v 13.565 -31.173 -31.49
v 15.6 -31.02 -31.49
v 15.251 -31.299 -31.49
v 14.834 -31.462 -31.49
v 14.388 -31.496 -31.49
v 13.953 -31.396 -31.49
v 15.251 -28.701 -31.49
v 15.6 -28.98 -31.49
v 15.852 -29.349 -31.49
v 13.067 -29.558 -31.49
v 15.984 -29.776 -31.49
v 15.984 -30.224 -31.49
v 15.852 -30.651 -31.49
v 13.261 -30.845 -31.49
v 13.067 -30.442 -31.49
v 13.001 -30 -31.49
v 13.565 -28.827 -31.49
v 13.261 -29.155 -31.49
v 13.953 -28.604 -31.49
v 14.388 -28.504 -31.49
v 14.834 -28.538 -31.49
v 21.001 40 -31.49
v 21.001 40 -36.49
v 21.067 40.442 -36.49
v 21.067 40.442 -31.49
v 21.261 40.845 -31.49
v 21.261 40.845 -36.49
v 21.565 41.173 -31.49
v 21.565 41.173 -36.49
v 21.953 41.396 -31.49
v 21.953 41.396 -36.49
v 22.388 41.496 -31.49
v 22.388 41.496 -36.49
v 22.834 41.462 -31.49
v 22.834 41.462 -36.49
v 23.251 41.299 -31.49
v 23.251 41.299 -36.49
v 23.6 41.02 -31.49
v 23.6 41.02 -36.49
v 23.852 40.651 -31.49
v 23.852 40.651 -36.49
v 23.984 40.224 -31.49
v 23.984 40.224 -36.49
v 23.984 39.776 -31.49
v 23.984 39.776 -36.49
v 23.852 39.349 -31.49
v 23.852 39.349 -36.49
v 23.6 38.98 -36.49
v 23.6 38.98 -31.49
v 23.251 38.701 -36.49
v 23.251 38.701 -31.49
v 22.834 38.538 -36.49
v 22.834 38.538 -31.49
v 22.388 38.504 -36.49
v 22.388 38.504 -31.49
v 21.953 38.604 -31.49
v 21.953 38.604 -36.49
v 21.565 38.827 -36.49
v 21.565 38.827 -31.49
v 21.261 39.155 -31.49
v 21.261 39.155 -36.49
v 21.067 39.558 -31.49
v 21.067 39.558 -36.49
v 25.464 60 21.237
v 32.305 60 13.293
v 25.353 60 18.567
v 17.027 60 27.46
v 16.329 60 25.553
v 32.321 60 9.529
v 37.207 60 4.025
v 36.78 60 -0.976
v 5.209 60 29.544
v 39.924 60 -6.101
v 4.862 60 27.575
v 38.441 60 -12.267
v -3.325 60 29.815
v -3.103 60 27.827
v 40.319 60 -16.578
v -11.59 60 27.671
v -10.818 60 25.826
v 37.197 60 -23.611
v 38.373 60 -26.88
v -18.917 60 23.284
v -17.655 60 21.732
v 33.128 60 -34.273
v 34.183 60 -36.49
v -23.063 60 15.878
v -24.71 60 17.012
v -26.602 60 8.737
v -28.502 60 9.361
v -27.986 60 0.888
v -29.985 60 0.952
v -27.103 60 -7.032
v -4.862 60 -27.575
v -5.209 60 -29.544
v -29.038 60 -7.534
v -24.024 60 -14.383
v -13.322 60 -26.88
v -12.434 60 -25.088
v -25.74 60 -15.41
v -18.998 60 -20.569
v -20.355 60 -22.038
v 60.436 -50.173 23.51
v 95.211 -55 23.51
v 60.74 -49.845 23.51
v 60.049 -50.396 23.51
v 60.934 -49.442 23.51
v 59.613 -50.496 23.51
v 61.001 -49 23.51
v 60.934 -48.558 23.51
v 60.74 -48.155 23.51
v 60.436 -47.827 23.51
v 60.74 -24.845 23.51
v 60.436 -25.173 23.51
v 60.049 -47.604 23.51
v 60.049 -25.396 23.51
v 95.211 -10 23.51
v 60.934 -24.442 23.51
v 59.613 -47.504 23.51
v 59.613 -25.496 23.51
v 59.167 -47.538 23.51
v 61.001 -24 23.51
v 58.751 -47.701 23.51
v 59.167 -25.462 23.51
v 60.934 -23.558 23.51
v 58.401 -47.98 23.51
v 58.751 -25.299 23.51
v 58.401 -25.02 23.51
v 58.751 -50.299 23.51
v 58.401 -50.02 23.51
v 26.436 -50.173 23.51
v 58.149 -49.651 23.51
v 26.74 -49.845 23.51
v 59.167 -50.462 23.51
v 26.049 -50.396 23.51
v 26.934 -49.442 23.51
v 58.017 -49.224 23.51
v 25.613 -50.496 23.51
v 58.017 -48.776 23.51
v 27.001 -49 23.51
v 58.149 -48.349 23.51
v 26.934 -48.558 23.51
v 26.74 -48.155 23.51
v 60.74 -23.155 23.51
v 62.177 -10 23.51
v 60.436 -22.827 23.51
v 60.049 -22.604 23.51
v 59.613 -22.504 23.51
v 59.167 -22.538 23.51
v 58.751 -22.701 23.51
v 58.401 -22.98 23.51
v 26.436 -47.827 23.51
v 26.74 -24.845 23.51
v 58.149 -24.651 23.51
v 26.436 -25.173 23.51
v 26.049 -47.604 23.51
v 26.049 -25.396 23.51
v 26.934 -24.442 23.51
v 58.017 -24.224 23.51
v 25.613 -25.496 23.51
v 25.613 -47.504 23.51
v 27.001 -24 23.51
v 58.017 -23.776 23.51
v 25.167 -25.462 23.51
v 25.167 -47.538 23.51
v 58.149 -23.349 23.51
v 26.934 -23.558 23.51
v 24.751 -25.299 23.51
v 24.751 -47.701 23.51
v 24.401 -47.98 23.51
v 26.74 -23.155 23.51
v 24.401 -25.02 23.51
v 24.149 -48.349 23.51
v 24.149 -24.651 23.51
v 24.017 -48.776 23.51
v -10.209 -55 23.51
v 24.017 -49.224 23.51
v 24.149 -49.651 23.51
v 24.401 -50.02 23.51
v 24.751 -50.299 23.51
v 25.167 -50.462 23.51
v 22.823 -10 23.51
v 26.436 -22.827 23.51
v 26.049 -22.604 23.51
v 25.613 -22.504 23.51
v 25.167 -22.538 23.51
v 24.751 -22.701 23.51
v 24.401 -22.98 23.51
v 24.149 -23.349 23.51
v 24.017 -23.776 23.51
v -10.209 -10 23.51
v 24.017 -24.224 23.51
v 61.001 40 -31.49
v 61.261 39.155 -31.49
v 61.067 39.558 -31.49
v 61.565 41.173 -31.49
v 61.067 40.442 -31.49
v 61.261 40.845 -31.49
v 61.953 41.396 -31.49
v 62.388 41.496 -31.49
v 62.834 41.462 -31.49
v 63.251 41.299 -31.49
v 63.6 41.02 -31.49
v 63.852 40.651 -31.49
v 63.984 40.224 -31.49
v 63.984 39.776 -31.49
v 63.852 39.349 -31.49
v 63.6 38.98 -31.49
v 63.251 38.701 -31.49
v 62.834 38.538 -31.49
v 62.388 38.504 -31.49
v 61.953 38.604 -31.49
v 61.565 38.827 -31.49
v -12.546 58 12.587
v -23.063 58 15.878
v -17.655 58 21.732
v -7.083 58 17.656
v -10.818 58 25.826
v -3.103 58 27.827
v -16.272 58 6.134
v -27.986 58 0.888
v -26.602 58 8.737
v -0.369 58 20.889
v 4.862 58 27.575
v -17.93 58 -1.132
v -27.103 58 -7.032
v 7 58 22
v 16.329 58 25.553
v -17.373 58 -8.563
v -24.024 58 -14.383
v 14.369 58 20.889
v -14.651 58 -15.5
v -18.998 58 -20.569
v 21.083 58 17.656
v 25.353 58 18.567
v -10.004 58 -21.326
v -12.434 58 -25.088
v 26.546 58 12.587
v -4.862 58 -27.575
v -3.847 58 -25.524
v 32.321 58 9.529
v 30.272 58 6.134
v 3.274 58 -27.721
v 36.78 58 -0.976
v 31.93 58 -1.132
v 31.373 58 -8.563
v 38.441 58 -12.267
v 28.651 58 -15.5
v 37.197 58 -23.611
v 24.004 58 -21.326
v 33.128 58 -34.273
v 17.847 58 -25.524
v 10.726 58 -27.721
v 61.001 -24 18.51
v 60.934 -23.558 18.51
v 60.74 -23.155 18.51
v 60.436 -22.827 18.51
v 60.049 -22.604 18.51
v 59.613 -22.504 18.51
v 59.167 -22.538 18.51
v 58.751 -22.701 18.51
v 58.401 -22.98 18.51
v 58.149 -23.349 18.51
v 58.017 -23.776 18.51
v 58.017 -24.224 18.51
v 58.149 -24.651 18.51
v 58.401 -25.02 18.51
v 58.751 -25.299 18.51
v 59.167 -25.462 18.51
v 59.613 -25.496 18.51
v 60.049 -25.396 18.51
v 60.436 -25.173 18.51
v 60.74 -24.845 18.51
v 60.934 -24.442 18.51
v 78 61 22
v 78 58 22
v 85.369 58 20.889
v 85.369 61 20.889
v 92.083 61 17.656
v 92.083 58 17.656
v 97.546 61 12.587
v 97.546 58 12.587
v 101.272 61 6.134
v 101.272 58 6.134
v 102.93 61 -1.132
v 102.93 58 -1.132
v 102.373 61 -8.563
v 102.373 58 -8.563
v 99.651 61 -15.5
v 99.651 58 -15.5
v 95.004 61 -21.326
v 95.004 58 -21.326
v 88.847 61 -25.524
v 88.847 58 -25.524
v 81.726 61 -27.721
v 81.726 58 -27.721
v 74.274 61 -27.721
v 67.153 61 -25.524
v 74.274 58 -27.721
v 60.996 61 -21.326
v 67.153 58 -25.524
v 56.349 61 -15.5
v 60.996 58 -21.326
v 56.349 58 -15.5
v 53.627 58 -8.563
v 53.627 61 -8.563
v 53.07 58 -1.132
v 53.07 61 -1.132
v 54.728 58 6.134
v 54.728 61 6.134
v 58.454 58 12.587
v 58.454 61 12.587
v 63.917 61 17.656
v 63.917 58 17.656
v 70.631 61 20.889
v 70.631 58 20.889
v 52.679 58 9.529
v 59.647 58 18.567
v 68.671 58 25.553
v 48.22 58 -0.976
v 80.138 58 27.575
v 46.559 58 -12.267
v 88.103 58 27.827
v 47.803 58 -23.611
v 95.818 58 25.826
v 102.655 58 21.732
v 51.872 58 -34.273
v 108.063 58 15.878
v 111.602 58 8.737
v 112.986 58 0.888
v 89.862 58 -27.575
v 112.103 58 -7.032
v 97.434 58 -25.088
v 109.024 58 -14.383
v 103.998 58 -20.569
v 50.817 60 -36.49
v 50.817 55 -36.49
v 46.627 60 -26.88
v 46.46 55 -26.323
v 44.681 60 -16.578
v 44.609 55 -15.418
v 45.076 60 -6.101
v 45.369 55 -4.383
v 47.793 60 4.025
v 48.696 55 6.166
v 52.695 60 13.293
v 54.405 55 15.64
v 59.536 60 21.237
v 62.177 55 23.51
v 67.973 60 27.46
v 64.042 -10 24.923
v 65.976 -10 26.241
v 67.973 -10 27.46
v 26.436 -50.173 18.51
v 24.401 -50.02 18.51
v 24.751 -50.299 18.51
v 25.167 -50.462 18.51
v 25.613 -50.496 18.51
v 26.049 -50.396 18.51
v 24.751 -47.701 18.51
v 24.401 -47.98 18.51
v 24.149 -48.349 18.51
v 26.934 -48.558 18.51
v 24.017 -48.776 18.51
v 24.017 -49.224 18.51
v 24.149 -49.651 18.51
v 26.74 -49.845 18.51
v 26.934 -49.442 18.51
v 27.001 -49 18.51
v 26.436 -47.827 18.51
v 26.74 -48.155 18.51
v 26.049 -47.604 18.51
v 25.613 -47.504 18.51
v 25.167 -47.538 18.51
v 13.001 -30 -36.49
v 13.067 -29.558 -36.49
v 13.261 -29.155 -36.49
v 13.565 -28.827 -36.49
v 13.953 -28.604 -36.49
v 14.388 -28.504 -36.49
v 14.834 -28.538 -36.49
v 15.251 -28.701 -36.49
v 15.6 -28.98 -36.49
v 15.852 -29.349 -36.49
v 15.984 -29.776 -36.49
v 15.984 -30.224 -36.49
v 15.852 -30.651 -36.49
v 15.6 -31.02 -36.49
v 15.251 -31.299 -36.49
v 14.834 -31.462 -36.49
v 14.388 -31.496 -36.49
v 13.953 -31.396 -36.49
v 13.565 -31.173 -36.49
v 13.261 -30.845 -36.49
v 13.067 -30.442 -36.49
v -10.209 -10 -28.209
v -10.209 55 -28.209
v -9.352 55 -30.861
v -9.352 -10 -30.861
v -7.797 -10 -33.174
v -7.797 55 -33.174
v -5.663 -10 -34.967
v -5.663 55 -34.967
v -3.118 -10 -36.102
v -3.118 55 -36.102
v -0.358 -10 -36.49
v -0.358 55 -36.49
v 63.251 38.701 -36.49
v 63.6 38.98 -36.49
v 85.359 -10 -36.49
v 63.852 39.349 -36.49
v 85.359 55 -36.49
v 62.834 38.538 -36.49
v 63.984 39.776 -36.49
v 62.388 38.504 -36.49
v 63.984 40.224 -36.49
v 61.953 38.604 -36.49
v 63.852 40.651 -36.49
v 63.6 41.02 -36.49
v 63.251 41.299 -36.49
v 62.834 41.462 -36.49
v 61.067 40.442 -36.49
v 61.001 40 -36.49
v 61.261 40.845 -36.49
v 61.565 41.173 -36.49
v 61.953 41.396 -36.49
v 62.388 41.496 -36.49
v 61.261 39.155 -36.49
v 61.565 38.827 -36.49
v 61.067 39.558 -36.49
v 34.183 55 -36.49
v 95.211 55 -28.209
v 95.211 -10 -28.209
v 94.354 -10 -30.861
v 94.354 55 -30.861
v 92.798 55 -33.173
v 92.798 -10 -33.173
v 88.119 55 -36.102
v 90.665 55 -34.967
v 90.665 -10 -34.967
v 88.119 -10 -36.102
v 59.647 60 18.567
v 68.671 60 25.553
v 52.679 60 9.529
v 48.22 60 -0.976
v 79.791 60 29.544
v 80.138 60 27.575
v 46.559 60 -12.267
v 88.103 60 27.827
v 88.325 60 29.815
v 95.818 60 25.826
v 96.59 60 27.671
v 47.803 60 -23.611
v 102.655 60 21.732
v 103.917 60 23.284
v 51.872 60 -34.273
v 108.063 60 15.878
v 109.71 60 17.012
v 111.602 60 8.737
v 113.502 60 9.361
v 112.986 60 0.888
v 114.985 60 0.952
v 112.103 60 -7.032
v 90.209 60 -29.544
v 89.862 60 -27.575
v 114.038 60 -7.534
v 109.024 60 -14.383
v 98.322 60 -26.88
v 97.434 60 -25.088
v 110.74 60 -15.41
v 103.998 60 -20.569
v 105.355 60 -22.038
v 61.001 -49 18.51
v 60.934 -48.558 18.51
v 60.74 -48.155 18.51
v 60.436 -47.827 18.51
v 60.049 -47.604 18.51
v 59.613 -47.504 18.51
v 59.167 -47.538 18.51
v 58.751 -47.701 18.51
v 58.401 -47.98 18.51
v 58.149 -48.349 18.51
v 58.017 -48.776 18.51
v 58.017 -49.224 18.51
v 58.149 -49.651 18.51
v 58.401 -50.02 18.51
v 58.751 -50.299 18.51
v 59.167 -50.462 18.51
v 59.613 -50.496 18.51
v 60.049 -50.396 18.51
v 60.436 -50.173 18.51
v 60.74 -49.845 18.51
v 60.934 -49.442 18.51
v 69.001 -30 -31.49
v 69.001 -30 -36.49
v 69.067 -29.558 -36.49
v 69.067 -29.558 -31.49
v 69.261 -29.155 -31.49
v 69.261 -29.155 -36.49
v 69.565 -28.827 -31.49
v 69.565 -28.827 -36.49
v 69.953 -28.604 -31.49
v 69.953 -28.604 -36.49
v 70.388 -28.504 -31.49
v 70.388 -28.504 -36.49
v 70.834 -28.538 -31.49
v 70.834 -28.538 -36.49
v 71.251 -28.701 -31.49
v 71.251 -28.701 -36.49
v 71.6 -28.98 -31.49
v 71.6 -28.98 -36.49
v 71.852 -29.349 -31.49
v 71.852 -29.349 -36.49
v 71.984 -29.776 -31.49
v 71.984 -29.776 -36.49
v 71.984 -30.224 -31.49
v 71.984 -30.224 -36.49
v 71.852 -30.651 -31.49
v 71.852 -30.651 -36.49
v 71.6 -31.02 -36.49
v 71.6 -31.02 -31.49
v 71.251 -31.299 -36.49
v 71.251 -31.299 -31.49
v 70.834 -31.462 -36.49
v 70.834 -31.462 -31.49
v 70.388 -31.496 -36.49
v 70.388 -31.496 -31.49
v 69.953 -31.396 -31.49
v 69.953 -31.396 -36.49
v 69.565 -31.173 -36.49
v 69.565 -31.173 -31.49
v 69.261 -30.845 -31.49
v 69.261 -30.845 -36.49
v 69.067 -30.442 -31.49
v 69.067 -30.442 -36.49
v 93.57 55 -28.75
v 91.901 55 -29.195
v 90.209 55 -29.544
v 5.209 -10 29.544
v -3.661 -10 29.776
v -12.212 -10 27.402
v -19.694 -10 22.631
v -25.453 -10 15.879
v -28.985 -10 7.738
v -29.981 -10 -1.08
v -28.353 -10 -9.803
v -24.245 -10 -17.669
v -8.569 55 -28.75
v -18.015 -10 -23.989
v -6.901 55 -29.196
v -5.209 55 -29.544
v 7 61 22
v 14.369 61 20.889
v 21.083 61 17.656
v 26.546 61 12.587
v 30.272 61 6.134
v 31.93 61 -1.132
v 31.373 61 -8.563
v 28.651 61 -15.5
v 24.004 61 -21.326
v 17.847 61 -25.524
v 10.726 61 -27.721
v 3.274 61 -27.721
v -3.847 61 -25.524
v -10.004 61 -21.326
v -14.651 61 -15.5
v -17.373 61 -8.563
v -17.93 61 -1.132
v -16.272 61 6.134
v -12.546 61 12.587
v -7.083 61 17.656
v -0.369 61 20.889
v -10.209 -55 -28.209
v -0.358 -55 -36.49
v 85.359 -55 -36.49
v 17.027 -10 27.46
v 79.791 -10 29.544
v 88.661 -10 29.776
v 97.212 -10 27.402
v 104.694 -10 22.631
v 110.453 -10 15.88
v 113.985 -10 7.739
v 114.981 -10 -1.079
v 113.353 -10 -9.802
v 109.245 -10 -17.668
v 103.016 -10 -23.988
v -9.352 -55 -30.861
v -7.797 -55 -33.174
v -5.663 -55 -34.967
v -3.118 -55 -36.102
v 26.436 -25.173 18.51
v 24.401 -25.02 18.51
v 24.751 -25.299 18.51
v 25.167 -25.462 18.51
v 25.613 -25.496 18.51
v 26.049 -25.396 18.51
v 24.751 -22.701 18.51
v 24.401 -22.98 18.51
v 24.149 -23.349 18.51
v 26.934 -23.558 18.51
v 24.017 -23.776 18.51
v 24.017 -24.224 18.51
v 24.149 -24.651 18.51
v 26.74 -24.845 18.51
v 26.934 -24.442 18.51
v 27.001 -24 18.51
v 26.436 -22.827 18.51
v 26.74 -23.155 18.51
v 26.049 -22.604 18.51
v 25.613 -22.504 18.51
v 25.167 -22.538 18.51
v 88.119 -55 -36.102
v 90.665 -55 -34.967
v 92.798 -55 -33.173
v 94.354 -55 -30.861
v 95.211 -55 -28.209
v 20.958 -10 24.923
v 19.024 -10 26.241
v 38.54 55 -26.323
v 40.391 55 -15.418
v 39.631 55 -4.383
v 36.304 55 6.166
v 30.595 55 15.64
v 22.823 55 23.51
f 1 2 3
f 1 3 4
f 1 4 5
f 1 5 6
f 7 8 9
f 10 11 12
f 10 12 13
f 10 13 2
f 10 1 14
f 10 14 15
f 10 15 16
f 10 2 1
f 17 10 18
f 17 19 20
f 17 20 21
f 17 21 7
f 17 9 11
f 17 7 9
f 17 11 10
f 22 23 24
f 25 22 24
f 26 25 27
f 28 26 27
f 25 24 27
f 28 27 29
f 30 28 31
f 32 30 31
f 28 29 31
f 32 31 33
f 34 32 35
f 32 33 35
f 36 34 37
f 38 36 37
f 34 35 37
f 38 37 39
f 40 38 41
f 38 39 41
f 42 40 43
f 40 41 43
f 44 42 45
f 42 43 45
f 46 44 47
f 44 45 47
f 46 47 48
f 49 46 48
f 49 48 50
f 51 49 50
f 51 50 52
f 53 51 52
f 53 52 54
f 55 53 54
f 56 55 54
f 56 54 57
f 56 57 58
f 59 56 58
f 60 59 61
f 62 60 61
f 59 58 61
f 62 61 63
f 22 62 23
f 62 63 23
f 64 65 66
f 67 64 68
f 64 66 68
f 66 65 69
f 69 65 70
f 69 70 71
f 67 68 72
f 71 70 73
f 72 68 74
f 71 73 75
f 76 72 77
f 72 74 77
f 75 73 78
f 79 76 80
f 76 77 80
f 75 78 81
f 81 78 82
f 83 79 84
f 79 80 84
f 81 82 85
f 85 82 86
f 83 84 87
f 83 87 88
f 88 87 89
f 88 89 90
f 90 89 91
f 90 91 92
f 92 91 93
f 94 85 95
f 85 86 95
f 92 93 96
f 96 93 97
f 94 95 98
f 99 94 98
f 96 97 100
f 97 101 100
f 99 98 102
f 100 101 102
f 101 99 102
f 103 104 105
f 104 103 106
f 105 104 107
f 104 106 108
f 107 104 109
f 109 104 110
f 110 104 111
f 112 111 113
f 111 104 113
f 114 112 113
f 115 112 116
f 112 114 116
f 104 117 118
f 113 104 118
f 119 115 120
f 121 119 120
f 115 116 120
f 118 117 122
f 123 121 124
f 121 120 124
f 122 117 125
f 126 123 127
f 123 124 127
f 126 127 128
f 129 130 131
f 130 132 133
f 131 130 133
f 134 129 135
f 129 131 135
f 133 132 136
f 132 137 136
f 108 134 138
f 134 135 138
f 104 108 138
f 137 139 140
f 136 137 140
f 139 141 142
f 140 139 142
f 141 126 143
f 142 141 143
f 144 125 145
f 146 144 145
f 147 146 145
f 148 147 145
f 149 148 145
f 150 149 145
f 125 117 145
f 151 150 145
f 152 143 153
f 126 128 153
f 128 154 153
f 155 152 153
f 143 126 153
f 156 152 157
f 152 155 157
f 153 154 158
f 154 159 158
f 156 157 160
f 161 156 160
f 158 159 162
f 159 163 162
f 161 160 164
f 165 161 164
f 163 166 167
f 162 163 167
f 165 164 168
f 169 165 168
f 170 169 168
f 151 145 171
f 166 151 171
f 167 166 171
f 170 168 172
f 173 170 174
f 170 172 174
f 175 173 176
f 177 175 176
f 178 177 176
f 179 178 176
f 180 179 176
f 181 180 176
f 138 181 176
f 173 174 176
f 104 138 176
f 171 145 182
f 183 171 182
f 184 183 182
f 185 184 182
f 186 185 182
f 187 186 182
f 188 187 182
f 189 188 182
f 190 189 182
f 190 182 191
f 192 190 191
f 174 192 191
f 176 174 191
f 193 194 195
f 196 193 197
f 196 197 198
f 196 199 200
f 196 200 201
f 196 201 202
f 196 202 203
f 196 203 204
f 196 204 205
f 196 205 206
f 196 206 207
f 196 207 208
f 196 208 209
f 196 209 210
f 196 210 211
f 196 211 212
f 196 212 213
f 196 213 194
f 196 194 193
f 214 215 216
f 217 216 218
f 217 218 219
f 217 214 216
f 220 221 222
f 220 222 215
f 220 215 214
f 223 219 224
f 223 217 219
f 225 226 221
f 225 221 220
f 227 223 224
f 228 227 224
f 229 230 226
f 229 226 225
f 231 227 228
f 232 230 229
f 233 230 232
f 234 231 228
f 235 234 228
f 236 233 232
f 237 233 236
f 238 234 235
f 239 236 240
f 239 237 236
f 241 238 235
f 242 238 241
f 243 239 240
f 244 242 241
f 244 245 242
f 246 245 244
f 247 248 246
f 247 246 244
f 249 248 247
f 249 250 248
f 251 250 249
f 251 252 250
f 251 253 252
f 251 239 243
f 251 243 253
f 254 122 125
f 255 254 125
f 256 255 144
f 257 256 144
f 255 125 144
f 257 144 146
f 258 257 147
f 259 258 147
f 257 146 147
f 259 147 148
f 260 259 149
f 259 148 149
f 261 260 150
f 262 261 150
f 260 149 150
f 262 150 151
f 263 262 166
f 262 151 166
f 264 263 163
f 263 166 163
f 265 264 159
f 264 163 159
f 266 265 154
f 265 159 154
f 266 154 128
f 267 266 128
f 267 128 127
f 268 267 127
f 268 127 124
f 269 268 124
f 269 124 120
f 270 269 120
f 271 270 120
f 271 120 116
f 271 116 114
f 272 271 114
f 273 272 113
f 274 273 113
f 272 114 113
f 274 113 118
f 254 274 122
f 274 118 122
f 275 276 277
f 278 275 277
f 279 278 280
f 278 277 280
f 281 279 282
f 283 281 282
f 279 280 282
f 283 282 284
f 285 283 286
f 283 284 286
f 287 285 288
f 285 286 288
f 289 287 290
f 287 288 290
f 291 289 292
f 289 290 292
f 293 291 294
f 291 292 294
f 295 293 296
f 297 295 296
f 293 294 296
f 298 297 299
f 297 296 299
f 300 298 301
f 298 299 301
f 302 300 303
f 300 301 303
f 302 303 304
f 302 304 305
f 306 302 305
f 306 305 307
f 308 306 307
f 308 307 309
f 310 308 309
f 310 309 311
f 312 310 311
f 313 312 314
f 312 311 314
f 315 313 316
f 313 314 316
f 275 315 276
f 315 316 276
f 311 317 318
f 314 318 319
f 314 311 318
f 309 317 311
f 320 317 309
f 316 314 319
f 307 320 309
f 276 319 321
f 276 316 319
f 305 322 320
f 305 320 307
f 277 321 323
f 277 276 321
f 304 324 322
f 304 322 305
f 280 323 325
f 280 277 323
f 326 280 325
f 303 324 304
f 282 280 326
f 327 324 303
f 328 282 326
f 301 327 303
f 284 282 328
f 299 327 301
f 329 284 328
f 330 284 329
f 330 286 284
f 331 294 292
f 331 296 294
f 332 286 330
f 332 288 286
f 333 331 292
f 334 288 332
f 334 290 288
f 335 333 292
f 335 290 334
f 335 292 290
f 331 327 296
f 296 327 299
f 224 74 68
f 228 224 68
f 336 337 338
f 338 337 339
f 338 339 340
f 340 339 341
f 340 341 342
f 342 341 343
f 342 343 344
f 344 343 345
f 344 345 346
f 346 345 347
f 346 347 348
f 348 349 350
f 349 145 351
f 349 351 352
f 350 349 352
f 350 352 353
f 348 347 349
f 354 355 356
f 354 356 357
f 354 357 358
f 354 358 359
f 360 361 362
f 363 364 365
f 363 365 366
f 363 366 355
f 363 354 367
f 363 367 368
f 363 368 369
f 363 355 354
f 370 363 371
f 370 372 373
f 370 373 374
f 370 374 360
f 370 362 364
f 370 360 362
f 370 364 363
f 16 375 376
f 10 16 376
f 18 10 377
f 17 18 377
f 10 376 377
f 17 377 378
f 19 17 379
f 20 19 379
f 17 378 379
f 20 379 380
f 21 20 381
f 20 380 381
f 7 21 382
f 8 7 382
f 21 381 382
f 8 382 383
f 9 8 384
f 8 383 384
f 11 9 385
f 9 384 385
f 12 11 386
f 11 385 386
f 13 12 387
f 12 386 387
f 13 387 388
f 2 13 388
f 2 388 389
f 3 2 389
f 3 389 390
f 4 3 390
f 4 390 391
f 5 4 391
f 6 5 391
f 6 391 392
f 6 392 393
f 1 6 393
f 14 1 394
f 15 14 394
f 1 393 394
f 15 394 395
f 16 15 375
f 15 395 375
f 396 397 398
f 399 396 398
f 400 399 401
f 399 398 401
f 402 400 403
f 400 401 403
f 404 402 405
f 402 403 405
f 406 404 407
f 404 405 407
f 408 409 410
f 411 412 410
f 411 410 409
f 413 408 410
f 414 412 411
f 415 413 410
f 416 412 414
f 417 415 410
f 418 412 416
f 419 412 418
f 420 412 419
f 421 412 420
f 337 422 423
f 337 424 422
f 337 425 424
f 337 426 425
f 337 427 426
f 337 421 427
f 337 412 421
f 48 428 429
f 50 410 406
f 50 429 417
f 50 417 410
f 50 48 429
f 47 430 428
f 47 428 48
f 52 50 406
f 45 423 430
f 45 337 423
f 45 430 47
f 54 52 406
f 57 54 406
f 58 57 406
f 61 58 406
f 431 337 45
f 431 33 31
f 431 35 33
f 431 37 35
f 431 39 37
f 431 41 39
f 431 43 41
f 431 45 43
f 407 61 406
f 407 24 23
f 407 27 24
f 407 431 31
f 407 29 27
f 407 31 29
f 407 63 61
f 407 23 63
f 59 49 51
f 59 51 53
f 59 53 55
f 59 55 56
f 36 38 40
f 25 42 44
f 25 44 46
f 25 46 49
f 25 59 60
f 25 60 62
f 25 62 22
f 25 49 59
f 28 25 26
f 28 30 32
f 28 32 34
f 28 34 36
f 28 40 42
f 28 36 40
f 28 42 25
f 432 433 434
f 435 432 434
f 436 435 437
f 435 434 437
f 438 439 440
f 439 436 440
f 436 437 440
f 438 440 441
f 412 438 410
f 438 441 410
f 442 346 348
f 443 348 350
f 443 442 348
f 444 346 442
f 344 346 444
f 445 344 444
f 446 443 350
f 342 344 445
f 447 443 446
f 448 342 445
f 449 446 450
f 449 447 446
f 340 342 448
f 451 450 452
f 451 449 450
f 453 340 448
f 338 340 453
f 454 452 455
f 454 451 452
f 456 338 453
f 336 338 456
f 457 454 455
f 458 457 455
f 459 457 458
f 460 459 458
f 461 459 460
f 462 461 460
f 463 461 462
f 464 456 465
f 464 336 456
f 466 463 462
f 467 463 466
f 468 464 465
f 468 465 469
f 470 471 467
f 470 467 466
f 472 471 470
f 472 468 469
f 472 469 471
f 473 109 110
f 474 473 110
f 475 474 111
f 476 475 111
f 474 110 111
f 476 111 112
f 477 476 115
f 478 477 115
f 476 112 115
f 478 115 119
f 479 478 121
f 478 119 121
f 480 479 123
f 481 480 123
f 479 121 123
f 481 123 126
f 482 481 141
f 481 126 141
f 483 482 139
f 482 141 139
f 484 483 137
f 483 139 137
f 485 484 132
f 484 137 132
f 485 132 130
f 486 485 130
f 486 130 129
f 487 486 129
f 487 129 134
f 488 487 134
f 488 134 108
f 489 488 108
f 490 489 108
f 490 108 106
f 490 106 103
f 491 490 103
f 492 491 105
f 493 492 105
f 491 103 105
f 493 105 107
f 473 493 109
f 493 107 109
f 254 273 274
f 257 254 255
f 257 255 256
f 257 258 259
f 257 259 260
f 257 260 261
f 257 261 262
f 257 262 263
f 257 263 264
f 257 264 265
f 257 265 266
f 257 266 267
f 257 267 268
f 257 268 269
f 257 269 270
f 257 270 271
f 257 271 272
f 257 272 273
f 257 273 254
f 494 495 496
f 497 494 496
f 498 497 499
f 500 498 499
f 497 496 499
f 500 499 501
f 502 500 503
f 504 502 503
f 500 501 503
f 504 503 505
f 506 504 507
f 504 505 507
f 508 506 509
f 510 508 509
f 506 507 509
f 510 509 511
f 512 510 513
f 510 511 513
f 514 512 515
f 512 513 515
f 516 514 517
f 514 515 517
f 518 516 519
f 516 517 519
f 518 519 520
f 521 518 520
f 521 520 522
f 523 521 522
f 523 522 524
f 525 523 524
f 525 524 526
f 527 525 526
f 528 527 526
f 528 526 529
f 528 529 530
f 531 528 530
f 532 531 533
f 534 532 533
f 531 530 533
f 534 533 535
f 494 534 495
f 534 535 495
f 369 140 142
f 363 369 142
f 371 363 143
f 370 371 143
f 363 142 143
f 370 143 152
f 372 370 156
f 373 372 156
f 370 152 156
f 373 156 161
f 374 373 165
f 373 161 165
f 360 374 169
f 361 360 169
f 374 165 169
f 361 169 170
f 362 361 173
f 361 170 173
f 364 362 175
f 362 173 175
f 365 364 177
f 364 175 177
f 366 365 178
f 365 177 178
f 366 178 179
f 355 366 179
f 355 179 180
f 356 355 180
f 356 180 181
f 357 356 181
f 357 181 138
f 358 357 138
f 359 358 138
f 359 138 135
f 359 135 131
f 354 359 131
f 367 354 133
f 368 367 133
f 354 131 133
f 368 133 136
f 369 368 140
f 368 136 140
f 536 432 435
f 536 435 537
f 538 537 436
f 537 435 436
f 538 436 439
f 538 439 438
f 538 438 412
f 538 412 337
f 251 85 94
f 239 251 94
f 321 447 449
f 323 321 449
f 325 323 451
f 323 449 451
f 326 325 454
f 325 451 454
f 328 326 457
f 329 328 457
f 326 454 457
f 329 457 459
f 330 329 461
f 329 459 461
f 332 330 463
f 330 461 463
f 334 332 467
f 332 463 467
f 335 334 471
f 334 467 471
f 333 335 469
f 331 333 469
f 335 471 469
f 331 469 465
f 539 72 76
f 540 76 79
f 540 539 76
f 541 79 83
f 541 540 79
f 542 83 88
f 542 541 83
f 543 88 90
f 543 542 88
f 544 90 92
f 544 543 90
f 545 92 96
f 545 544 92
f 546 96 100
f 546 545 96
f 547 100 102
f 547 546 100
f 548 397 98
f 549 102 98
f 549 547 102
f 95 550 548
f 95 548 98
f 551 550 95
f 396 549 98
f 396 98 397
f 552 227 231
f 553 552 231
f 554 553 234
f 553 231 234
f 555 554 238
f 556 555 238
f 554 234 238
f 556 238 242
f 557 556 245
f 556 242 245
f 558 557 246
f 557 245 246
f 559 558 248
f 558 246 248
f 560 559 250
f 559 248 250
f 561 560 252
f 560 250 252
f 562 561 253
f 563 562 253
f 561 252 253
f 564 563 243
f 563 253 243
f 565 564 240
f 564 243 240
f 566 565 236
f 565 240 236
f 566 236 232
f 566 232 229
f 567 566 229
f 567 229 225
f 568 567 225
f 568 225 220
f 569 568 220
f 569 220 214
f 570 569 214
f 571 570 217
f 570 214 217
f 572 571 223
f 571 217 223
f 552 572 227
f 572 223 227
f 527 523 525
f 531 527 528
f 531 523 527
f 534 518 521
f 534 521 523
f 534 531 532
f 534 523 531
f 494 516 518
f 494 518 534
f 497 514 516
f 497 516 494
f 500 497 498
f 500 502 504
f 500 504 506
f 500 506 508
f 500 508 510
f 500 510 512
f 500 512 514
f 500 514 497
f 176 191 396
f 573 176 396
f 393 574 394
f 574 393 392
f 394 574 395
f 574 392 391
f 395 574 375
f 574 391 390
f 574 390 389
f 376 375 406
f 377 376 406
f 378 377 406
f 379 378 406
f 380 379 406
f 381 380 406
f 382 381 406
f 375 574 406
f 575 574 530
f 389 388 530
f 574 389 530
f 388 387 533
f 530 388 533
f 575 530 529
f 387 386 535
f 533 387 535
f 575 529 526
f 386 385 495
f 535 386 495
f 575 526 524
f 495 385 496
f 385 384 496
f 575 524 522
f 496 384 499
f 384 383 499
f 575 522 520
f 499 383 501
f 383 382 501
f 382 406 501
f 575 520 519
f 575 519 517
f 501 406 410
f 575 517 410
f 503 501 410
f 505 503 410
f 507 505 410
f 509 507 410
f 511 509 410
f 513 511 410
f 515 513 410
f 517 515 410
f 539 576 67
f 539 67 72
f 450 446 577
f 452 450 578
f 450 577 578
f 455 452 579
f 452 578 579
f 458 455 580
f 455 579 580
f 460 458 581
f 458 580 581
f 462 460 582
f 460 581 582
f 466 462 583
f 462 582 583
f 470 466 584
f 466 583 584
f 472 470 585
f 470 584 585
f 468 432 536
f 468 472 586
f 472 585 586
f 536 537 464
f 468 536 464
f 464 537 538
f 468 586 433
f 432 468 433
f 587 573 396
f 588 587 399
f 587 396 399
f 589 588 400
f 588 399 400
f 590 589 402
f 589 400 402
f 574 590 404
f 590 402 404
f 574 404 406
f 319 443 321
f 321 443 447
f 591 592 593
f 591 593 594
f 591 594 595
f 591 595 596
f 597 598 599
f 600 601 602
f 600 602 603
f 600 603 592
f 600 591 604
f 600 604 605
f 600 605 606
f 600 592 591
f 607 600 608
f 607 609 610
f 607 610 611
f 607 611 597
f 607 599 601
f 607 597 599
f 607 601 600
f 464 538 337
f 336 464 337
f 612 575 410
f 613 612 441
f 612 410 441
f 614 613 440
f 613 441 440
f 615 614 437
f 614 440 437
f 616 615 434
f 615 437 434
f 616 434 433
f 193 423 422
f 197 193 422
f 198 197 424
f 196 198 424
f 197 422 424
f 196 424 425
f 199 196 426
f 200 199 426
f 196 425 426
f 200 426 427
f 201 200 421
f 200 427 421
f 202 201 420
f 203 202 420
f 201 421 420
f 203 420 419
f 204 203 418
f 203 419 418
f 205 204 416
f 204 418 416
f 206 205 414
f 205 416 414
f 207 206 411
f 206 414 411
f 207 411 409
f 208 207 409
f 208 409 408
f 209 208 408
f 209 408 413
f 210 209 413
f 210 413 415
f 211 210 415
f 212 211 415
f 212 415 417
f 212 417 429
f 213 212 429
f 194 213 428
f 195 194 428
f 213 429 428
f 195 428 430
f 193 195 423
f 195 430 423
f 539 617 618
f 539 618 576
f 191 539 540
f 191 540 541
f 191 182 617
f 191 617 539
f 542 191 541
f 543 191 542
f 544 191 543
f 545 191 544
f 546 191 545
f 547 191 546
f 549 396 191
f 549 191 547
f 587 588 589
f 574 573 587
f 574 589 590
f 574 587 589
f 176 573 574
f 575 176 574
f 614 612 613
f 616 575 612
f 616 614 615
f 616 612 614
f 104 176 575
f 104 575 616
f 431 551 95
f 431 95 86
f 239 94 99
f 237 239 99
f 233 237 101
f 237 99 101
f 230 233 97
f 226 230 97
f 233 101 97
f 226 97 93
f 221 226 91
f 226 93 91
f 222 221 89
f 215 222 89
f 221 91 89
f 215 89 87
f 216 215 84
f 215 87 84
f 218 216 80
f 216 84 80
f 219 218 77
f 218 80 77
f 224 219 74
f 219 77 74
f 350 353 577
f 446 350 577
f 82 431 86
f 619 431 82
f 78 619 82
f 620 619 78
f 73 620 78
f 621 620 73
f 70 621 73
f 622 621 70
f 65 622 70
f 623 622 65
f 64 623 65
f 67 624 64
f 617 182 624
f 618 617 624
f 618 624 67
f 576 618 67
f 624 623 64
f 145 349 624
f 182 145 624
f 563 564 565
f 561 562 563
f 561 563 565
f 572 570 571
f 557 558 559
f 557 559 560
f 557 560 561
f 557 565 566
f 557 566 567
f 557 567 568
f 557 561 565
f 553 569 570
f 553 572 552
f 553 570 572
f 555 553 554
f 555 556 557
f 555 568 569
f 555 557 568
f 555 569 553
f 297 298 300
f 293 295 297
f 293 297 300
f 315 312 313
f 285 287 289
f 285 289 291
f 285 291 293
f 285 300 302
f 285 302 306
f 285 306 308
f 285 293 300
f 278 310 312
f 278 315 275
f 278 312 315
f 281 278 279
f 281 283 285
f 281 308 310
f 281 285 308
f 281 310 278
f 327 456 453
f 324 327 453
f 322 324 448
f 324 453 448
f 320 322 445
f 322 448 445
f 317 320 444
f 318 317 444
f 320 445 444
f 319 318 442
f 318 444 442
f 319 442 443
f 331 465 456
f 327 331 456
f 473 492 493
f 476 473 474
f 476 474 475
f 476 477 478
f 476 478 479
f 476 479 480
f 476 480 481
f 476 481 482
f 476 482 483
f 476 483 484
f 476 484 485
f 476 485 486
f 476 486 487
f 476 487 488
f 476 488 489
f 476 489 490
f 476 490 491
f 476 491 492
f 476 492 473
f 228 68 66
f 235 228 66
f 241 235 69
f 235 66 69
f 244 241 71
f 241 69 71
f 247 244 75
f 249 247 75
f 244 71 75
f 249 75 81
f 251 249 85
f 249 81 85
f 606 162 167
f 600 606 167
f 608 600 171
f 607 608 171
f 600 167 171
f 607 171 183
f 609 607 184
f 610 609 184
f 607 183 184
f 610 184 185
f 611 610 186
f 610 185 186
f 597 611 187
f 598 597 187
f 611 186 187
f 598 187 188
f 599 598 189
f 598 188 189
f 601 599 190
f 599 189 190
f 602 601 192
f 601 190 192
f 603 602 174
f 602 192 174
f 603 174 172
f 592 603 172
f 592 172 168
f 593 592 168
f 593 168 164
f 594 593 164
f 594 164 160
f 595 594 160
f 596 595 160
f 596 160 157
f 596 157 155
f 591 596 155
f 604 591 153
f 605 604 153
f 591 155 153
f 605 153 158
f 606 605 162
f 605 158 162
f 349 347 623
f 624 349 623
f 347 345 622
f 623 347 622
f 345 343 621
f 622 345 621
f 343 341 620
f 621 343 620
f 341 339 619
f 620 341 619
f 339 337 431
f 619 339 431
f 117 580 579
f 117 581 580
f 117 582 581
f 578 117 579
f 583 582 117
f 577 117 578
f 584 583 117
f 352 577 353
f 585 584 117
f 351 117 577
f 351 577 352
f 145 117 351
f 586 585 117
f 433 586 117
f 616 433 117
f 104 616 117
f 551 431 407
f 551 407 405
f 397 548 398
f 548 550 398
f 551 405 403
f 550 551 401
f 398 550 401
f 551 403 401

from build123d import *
from build123d.topology import SkipClean

# Parameters (mm, degrees)
SALIENTE_EXTRUIR1_DEPTH        = 60
SALIENTE_EXTRUIR1_DEPTH_BACK   = 10
SALIENTE_EXTRUIR1_2_DEPTH      = 60
SALIENTE_EXTRUIR1_2_DEPTH_BACK = 10
CROQUIS5_W                     = 105.42
CROQUIS5_H                     = 65
SALIENTE_EXTRUIR4_DEPTH        = 60
REDONDEO1_R                    = 10
CORTAR_EXTRUIR3_DEPTH          = 2
CROQUIS8_R                     = 25
SALIENTE_EXTRUIR5_DEPTH        = 3
SALIENTE_EXTRUIR6_DEPTH        = 45
CROQUIS10_R                    = 1.5
CORTAR_EXTRUIR4_DEPTH          = 5
CROQUIS11_R                    = 1.5
CORTAR_EXTRUIR5_DEPTH          = 5


with BuildPart() as part:
    # Croquis1 → Saliente-Extruir1 (new, two sides: drawn at the far end of the back side and taken through both)
    with BuildSketch(Plane(origin=(0, 0, 0), x_dir=(1, 0, 0), z_dir=(0, 1, 0)).offset(-SALIENTE_EXTRUIR1_DEPTH_BACK)):
        with BuildLine():
            Line((-5.20944533, 29.54423259), (34.18286479, 36.490159697))
            ThreePointArc((34.18286479, 36.490159697), (38.849607431, 0.961785341), (17.027138366, -27.460454458))
            Line((17.027138366, -27.460454458), (5.20944533, -29.54423259))
            ThreePointArc((5.20944533, -29.54423259), (-29.54423259, -5.20944533), (-5.20944533, 29.54423259))
        make_face()
    extrude(amount=SALIENTE_EXTRUIR1_DEPTH + SALIENTE_EXTRUIR1_DEPTH_BACK)



with BuildPart() as body_2:
    # Croquis1 → Saliente-Extruir1 2 (new, two sides: drawn at the far end of the back side and taken through both)
    with BuildSketch(Plane(origin=(0, 0, 0), x_dir=(1, 0, 0), z_dir=(0, 1, 0)).offset(-SALIENTE_EXTRUIR1_2_DEPTH_BACK)):
        with BuildLine():
            Line((90.20944533, 29.54423259), (50.81713521, 36.490159697))
            ThreePointArc((50.81713521, 36.490159697), (46.150392569, 0.961785341), (67.972861634, -27.460454458))
            Line((67.972861634, -27.460454458), (79.79055467, -29.54423259))
            ThreePointArc((79.79055467, -29.54423259), (114.54423259, -5.20944533), (90.20944533, 29.54423259))
        make_face()
    extrude(amount=SALIENTE_EXTRUIR1_2_DEPTH + SALIENTE_EXTRUIR1_2_DEPTH_BACK)


with BuildPart() as part_1:
    add(part.part)

    add(body_2.part)  # Saliente-Extruir4 merges body 2
    # Croquis5 → Saliente-Extruir4 (add)
    with BuildSketch(Plane(origin=(0, 0, -36.490159697), x_dir=(-1, 0, 0), z_dir=(0, 0, -1))):
        with Locations((-42.50055467, 22.5)):
            Rectangle(CROQUIS5_W, CROQUIS5_H)
    extrude(amount=-SALIENTE_EXTRUIR4_DEPTH)

    # Redondeo1
    # the kernel refuses this fillet: 10 mm, written as the material it takes off along each edge
    with BuildSketch(Plane(origin=(-10.20944533, 79.627778647, -36.490159697), x_dir=(1, 0, 0), z_dir=(0, -1, 0))) as redondeo1_piece_1:
        with BuildLine():
            CenterArc((9.851111459, 10), REDONDEO1_R, 189.899393553, 80.100606447)
            Line((0, 8.280813266), (-0.197022229, 8.246429532))
            ThreePointArc((-0.197022229, 8.246429532), (-0.2, 4.140406633), (-0.2, 0))
            Line((-0.2, 0), (0, -0.2))
            Line((0, -0.2), (9.851111459, -0.2))
            Line((9.851111459, -0.2), (9.851111459, 0))
        make_face()
    extrude(amount=114.255557294, mode=Mode.SUBTRACT)
    with BuildSketch(Plane(origin=(95.21055467, -34.627953804, -36.490159697), x_dir=(-1, 0, 0), z_dir=(0, 1, 0))) as redondeo1_piece_2:
        with BuildLine():
            CenterArc((9.851181521, 10), REDONDEO1_R, 189.897058287, 80.102941713)
            Line((0, 8.28121478), (-0.19702363, 8.246839076))
            ThreePointArc((-0.19702363, 8.246839076), (-0.2, 4.14060739), (-0.2, 0))
            Line((-0.2, 0), (0, -0.2))
            Line((0, -0.2), (9.851181521, -0.2))
            Line((9.851181521, -0.2), (9.851181521, 0))
        make_face()
    extrude(amount=114.255907607, mode=Mode.SUBTRACT)

    # Croquis7 → Cortar-Extruir3 (cut)
    with BuildSketch(Plane(origin=(0, 60, 0), x_dir=(1, 0, 0), z_dir=(0, 1, 0))):
        with BuildLine():
            Line((4.862148975, -27.574617084), (16.328937751, -25.552712841))
            ThreePointArc((16.328937751, -25.552712841), (36.779644877, 0.976339149), (33.127899287, 34.273287591))
            Line((33.127899287, 34.273287591), (-4.862148975, 27.574617084))
            ThreePointArc((-4.862148975, 27.574617084), (-27.574617084, -4.862148975), (4.862148975, -27.574617084))
        make_face()
        with BuildLine():
            Line((89.862148975, 27.574617084), (51.872100713, 34.273287591))
            ThreePointArc((51.872100713, 34.273287591), (48.220355123, 0.976339149), (68.671062249, -25.552712841))
            Line((68.671062249, -25.552712841), (80.137851025, -27.574617084))
            ThreePointArc((80.137851025, -27.574617084), (112.574617084, -4.862148975), (89.862148975, 27.574617084))
        make_face()
    extrude(amount=-CORTAR_EXTRUIR3_DEPTH, mode=Mode.SUBTRACT)

    # Croquis8 → Saliente-Extruir5 (add)
    with BuildSketch(Plane(origin=(0, 58, 0), x_dir=(1, 0, 0), z_dir=(0, 1, 0))):
        with Locations(Location((7, 3, 0), (0, 0, 270))):
            Circle(CROQUIS8_R)
        with Locations(Location((78, 3, 0), (0, 0, 270))):
            Circle(CROQUIS8_R)
    extrude(amount=SALIENTE_EXTRUIR5_DEPTH)

    # Croquis9 → Saliente-Extruir6 (add)
    with SkipClean():  # the faces are left unmerged after this step: merging them gives an invalid solid
        with BuildSketch(Plane.XZ.offset(10)):
            with BuildLine():
                ThreePointArc((85.359373149, -36.490159697), (91.794128303, -34.144826646), (95.21055467, -28.208944917))
                Line((95.21055467, -28.208944917), (95.21055467, 23.509840303))
                Line((95.21055467, 23.509840303), (62.176934943, 23.509840303))
                Line((62.176934943, 23.509840303), (22.823065057, 23.509840303))
                Line((22.823065057, 23.509840303), (-10.20944533, 23.509840303))
                Line((-10.20944533, 23.509840303), (-10.20944533, -28.209346431))
                ThreePointArc((-10.20944533, -28.209346431), (-6.79293303, -34.144957779), (-0.358333871, -36.490159697))
                Line((-0.358333871, -36.490159697), (85.359373149, -36.490159697))
            make_face()
        extrude(amount=SALIENTE_EXTRUIR6_DEPTH)

    # Croquis10 → Cortar-Extruir4 (cut)
    with SkipClean():  # the faces are left unmerged after this step: merging them gives an invalid solid
        with BuildSketch(Plane.XY.offset(23.509840303)):
            with Locations((59.50055467, -24)):
                Circle(CROQUIS10_R)
            with Locations((59.50055467, -49)):
                Circle(CROQUIS10_R)
            with Locations((25.50055467, -24)):
                Circle(CROQUIS10_R)
            with Locations((25.50055467, -49)):
                Circle(CROQUIS10_R)
        extrude(amount=-CORTAR_EXTRUIR4_DEPTH, mode=Mode.SUBTRACT)

    # Croquis11 → Cortar-Extruir5 (cut)
    with SkipClean():  # the faces are left unmerged after this step: merging them gives an invalid solid
        with BuildSketch(Plane(origin=(0, 0, -36.490159697), x_dir=(-1, 0, 0), z_dir=(0, 0, -1))):
            with Locations((-62.500519639, 40)):
                Circle(CROQUIS11_R)
            with Locations((-22.500519639, 40)):
                Circle(CROQUIS11_R)
            with Locations((-14.500519639, -30)):
                Circle(CROQUIS11_R)
            with Locations((-70.500519639, -30)):
                Circle(CROQUIS11_R)
        extrude(amount=-CORTAR_EXTRUIR5_DEPTH, mode=Mode.SUBTRACT)


solid = part_1.part
